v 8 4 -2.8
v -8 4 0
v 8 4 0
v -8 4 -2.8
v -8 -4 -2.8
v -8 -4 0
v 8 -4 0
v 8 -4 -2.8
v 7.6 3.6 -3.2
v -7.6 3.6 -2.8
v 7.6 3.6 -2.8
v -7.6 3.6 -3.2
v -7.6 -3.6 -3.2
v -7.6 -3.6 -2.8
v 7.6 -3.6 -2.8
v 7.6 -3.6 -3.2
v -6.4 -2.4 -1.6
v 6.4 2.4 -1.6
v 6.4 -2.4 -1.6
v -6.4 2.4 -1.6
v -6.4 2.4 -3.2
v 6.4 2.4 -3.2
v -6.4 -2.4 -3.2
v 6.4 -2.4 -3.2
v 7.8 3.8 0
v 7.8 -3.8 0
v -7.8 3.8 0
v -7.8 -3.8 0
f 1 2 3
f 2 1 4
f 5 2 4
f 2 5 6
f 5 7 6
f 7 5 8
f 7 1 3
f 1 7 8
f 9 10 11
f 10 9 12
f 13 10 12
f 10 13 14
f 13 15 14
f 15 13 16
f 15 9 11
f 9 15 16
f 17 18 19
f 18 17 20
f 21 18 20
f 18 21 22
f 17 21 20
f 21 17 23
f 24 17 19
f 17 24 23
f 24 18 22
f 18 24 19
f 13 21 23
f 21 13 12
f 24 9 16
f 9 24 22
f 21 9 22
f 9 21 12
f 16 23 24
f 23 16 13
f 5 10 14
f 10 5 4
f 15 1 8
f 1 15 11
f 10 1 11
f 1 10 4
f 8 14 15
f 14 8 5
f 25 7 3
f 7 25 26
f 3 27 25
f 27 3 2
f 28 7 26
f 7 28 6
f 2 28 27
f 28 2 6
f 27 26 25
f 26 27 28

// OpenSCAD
// file: ../p/box5.scad
use <../lib.scad>
function ldraw_lib__box5() = [
// 0 Box with 5 Faces and All Edges
// 0 Name: box5.dat
// 0 Author: James Jessiman
// 0 !LDRAW_ORG Primitive UPDATE 2012-01
// 0 !LICENSE Licensed under CC BY 4.0 : see CAreadme.txt
// 
// 0 BFC CERTIFY CCW
  [0,"BFC","CERTIFY"],
  [0,"BFC","CCW"],
// 
// 0 !HISTORY 2002-04-03 [sbliss] Modified for BFC compliance
// 0 !HISTORY 2002-04-25 [PTadmin] Official Update 2002-02
// 0 !HISTORY 2007-06-24 [PTadmin] Header formatted for Contributor Agreement
// 0 !HISTORY 2008-07-01 [PTadmin] Official Update 2008-01
// 0 !HISTORY 2012-02-16 [Philo] Changed to CCW
// 0 !HISTORY 2012-03-30 [PTadmin] Official Update 2012-01
// 
// 
// 2 24 1 1 1 -1 1 1
  [2,24,1,1,1,-1,1,1],
// 2 24 -1 1 1 -1 1 -1
  [2,24,-1,1,1,-1,1,-1],
// 2 24 -1 1 -1 1 1 -1
  [2,24,-1,1,-1,1,1,-1],
// 2 24 1 1 -1 1 1 1
  [2,24,1,1,-1,1,1,1],
// 2 24 1 0 1 -1 0 1
  [2,24,1,0,1,-1,0,1],
// 2 24 -1 0 1 -1 0 -1
  [2,24,-1,0,1,-1,0,-1],
// 2 24 -1 0 -1 1 0 -1
  [2,24,-1,0,-1,1,0,-1],
// 2 24 1 0 -1 1 0 1
  [2,24,1,0,-1,1,0,1],
// 2 24 1 0 1 1 1 1
  [2,24,1,0,1,1,1,1],
// 2 24 -1 0 1 -1 1 1
  [2,24,-1,0,1,-1,1,1],
// 2 24 1 0 -1 1 1 -1
  [2,24,1,0,-1,1,1,-1],
// 2 24 -1 0 -1 -1 1 -1
  [2,24,-1,0,-1,-1,1,-1],
// 4 16 -1 1 1 1 1 1 1 1 -1 -1 1 -1
  [4,16,-1,1,1,1,1,1,1,1,-1,-1,1,-1],
// 4 16 -1 1 1 -1 0 1 1 0 1 1 1 1
  [4,16,-1,1,1,-1,0,1,1,0,1,1,1,1],
// 4 16 -1 1 -1 -1 0 -1 -1 0 1 -1 1 1
  [4,16,-1,1,-1,-1,0,-1,-1,0,1,-1,1,1],
// 4 16 1 1 -1 1 0 -1 -1 0 -1 -1 1 -1
  [4,16,1,1,-1,1,0,-1,-1,0,-1,-1,1,-1],
// 4 16 1 1 1 1 0 1 1 0 -1 1 1 -1
  [4,16,1,1,1,1,0,1,1,0,-1,1,1,-1],
];
module ldraw_lib__box5(step=0, col=false, unit=2/5, alt=false, line=0.2, solid=!$preview)
    makepoly(ldraw_lib__box5(), step=step, col=col, unit=unit, alt=alt, line=line, solid=solid);
ldraw_lib__box5(line=0.2);
// file: ../p/box4.scad
use <../lib.scad>
function ldraw_lib__box4() = [
// 0 Box with 4 Faces (2 Parallel Pairs) and All Edges
// 0 Name: box4.dat
// 0 Author: James Jessiman
// 0 !LDRAW_ORG Primitive UPDATE 2012-01
// 0 !LICENSE Licensed under CC BY 4.0 : see CAreadme.txt
// 
// 0 BFC CERTIFY CCW
  [0,"BFC","CERTIFY"],
  [0,"BFC","CCW"],
// 
// 0 !HISTORY 2002-04-03 [sbliss] Modified for BFC compliance
// 0 !HISTORY 2002-04-25 [PTadmin] Official Update 2002-02
// 0 !HISTORY 2007-06-24 [PTadmin] Header formatted for Contributor Agreement
// 0 !HISTORY 2008-07-01 [PTadmin] Official Update 2008-01
// 0 !HISTORY 2012-02-16 [Philo] Changed to CCW
// 0 !HISTORY 2012-03-30 [PTadmin] Official Update 2012-01
// 
// 
// 2 24 1 1 1 -1 1 1
  [2,24,1,1,1,-1,1,1],
// 2 24 -1 1 1 -1 1 -1
  [2,24,-1,1,1,-1,1,-1],
// 2 24 -1 1 -1 1 1 -1
  [2,24,-1,1,-1,1,1,-1],
// 2 24 1 1 -1 1 1 1
  [2,24,1,1,-1,1,1,1],
// 2 24 1 0 1 -1 0 1
  [2,24,1,0,1,-1,0,1],
// 2 24 -1 0 1 -1 0 -1
  [2,24,-1,0,1,-1,0,-1],
// 2 24 -1 0 -1 1 0 -1
  [2,24,-1,0,-1,1,0,-1],
// 2 24 1 0 -1 1 0 1
  [2,24,1,0,-1,1,0,1],
// 2 24 1 0 1 1 1 1
  [2,24,1,0,1,1,1,1],
// 2 24 -1 0 1 -1 1 1
  [2,24,-1,0,1,-1,1,1],
// 2 24 1 0 -1 1 1 -1
  [2,24,1,0,-1,1,1,-1],
// 2 24 -1 0 -1 -1 1 -1
  [2,24,-1,0,-1,-1,1,-1],
// 4 16 -1 1 1 -1 0 1 1 0 1 1 1 1
  [4,16,-1,1,1,-1,0,1,1,0,1,1,1,1],
// 4 16 -1 1 -1 -1 0 -1 -1 0 1 -1 1 1
  [4,16,-1,1,-1,-1,0,-1,-1,0,1,-1,1,1],
// 4 16 1 1 -1 1 0 -1 -1 0 -1 -1 1 -1
  [4,16,1,1,-1,1,0,-1,-1,0,-1,-1,1,-1],
// 4 16 1 1 1 1 0 1 1 0 -1 1 1 -1
  [4,16,1,1,1,1,0,1,1,0,-1,1,1,-1],
];
module ldraw_lib__box4(step=0, col=false, unit=2/5, alt=false, line=0.2, solid=!$preview)
    makepoly(ldraw_lib__box4(), step=step, col=col, unit=unit, alt=alt, line=line, solid=solid);
ldraw_lib__box4(line=0.2);
// file: s/3069bs01.scad
use <../../lib.scad>
use <../../p/box4.scad>
use <../../p/box5.scad>
function ldraw_lib__s__3069bs01() = [
// 0 ~Tile  1 x  2 with Groove without Top Face
// 0 Name: s\3069bs01.dat
// 0 Author: Santeri Piippo [arezey]
// 0 !LDRAW_ORG Subpart UPDATE 2010-02
// 0 !LICENSE Licensed under CC BY 4.0 : see CAreadme.txt
// 
// 0 BFC CERTIFY CCW
  [0,"BFC","CERTIFY"],
  [0,"BFC","CCW"],
// 
// 0 !HISTORY 2010-07-05 [PTadmin] Official Update 2010-02
// 
// 
// 1 16 0 0 0 20 0 0 0 7 0 0 0 10 box4.dat
  [1,16,0,0,0,20,0,0,0,7,0,0,0,10, ldraw_lib__box4()],
// 1 16 0 7 0 19 0 0 0 1 0 0 0 9 box4.dat
  [1,16,0,7,0,19,0,0,0,1,0,0,0,9, ldraw_lib__box4()],
// 0 BFC INVERTNEXT
  [0,"BFC","INVERTNEXT"],
// 1 16 0 8 0 16 0 0 0 -4 0 0 0 6 box5.dat
  [1,16,0,8,0,16,0,0,0,-4,0,0,0,6, ldraw_lib__box5()],
// 4 16 -19 8 9 -16 8 6 -16 8 -6 -19 8 -9
  [4,16,-19,8,9,-16,8,6,-16,8,-6,-19,8,-9],
// 4 16 19 8 -9 16 8 -6 16 8 6 19 8 9
  [4,16,19,8,-9,16,8,-6,16,8,6,19,8,9],
// 4 16 19 8 9 16 8 6 -16 8 6 -19 8 9
  [4,16,19,8,9,16,8,6,-16,8,6,-19,8,9],
// 4 16 -19 8 -9 -16 8 -6 16 8 -6 19 8 -9
  [4,16,-19,8,-9,-16,8,-6,16,8,-6,19,8,-9],
// 4 16 -20 7 10 -19 7 9 -19 7 -9 -20 7 -10
  [4,16,-20,7,10,-19,7,9,-19,7,-9,-20,7,-10],
// 4 16 20 7 -10 19 7 -9 19 7 9 20 7 10
  [4,16,20,7,-10,19,7,-9,19,7,9,20,7,10],
// 4 16 20 7 10 19 7 9 -19 7 9 -20 7 10
  [4,16,20,7,10,19,7,9,-19,7,9,-20,7,10],
// 4 16 -20 7 -10 -19 7 -9 19 7 -9 20 7 -10
  [4,16,-20,7,-10,-19,7,-9,19,7,-9,20,7,-10],
// 0 //
];
module ldraw_lib__s__3069bs01(step=0, col=false, unit=2/5, alt=false, line=0.2, solid=!$preview)
    makepoly(ldraw_lib__s__3069bs01(), step=step, col=col, unit=unit, alt=alt, line=line, solid=solid);
ldraw_lib__s__3069bs01(line=0.2);
// main file
use <../lib.scad>
use <s/3069bs01.scad>
function ldraw_lib__3069bp0w() = [
// 0 Tile  1 x  2 with Black Rectangle Pattern
// 0 Name: 3069bp0w.dat
// 0 Author: Philippe Hurbain [Philo]
// 0 !LDRAW_ORG Part UPDATE 2024-07
// 0 !LICENSE Licensed under CC BY 4.0 : see CAreadme.txt
// 
// 0 BFC CERTIFY CCW
  [0,"BFC","CERTIFY"],
  [0,"BFC","CCW"],
// 
// 0 !KEYWORDS BrickLink 3069pb1275, Icons, Lamborghini, Rebrickable 3069bpr0452
// 0 !KEYWORDS Set 10337
// 
// 0 !HISTORY 2024-08-26 [OrionP] Official Update 2024-07
// 
// 1 16 0 0 0 1 0 0 0 1 0 0 0 1 s\3069bs01.dat
  [1,16,0,0,0,1,0,0,0,1,0,0,0,1, ldraw_lib__s__3069bs01()],
// 4 16 20 0 10 19.5 0 9.5 19.5 0 -9.5 20 0 -10
  [4,16,20,0,10,19.5,0,9.5,19.5,0,-9.5,20,0,-10],
// 4 16 -19.5 0 9.5 19.5 0 9.5 20 0 10 -20 0 10
  [4,16,-19.5,0,9.5,19.5,0,9.5,20,0,10,-20,0,10],
// 4 16 -20 0 -10 20 0 -10 19.5 0 -9.5 -19.5 0 -9.5
  [4,16,-20,0,-10,20,0,-10,19.5,0,-9.5,-19.5,0,-9.5],
// 4 16 -20 0 -10 -19.5 0 -9.5 -19.5 0 9.5 -20 0 10
  [4,16,-20,0,-10,-19.5,0,-9.5,-19.5,0,9.5,-20,0,10],
// 4 0 -19.5 0 -9.5 19.5 0 -9.5 19.5 0 9.5 -19.5 0 9.5
  [4,0,-19.5,0,-9.5,19.5,0,-9.5,19.5,0,9.5,-19.5,0,9.5],
];
module ldraw_lib__3069bp0w(step=0, col=false, unit=2/5, alt=false, line=0.2, solid=!$preview)
    makepoly(ldraw_lib__3069bp0w(), step=step, col=col, unit=unit, alt=alt, line=line, solid=solid);
ldraw_lib__3069bp0w(line=0.2);
